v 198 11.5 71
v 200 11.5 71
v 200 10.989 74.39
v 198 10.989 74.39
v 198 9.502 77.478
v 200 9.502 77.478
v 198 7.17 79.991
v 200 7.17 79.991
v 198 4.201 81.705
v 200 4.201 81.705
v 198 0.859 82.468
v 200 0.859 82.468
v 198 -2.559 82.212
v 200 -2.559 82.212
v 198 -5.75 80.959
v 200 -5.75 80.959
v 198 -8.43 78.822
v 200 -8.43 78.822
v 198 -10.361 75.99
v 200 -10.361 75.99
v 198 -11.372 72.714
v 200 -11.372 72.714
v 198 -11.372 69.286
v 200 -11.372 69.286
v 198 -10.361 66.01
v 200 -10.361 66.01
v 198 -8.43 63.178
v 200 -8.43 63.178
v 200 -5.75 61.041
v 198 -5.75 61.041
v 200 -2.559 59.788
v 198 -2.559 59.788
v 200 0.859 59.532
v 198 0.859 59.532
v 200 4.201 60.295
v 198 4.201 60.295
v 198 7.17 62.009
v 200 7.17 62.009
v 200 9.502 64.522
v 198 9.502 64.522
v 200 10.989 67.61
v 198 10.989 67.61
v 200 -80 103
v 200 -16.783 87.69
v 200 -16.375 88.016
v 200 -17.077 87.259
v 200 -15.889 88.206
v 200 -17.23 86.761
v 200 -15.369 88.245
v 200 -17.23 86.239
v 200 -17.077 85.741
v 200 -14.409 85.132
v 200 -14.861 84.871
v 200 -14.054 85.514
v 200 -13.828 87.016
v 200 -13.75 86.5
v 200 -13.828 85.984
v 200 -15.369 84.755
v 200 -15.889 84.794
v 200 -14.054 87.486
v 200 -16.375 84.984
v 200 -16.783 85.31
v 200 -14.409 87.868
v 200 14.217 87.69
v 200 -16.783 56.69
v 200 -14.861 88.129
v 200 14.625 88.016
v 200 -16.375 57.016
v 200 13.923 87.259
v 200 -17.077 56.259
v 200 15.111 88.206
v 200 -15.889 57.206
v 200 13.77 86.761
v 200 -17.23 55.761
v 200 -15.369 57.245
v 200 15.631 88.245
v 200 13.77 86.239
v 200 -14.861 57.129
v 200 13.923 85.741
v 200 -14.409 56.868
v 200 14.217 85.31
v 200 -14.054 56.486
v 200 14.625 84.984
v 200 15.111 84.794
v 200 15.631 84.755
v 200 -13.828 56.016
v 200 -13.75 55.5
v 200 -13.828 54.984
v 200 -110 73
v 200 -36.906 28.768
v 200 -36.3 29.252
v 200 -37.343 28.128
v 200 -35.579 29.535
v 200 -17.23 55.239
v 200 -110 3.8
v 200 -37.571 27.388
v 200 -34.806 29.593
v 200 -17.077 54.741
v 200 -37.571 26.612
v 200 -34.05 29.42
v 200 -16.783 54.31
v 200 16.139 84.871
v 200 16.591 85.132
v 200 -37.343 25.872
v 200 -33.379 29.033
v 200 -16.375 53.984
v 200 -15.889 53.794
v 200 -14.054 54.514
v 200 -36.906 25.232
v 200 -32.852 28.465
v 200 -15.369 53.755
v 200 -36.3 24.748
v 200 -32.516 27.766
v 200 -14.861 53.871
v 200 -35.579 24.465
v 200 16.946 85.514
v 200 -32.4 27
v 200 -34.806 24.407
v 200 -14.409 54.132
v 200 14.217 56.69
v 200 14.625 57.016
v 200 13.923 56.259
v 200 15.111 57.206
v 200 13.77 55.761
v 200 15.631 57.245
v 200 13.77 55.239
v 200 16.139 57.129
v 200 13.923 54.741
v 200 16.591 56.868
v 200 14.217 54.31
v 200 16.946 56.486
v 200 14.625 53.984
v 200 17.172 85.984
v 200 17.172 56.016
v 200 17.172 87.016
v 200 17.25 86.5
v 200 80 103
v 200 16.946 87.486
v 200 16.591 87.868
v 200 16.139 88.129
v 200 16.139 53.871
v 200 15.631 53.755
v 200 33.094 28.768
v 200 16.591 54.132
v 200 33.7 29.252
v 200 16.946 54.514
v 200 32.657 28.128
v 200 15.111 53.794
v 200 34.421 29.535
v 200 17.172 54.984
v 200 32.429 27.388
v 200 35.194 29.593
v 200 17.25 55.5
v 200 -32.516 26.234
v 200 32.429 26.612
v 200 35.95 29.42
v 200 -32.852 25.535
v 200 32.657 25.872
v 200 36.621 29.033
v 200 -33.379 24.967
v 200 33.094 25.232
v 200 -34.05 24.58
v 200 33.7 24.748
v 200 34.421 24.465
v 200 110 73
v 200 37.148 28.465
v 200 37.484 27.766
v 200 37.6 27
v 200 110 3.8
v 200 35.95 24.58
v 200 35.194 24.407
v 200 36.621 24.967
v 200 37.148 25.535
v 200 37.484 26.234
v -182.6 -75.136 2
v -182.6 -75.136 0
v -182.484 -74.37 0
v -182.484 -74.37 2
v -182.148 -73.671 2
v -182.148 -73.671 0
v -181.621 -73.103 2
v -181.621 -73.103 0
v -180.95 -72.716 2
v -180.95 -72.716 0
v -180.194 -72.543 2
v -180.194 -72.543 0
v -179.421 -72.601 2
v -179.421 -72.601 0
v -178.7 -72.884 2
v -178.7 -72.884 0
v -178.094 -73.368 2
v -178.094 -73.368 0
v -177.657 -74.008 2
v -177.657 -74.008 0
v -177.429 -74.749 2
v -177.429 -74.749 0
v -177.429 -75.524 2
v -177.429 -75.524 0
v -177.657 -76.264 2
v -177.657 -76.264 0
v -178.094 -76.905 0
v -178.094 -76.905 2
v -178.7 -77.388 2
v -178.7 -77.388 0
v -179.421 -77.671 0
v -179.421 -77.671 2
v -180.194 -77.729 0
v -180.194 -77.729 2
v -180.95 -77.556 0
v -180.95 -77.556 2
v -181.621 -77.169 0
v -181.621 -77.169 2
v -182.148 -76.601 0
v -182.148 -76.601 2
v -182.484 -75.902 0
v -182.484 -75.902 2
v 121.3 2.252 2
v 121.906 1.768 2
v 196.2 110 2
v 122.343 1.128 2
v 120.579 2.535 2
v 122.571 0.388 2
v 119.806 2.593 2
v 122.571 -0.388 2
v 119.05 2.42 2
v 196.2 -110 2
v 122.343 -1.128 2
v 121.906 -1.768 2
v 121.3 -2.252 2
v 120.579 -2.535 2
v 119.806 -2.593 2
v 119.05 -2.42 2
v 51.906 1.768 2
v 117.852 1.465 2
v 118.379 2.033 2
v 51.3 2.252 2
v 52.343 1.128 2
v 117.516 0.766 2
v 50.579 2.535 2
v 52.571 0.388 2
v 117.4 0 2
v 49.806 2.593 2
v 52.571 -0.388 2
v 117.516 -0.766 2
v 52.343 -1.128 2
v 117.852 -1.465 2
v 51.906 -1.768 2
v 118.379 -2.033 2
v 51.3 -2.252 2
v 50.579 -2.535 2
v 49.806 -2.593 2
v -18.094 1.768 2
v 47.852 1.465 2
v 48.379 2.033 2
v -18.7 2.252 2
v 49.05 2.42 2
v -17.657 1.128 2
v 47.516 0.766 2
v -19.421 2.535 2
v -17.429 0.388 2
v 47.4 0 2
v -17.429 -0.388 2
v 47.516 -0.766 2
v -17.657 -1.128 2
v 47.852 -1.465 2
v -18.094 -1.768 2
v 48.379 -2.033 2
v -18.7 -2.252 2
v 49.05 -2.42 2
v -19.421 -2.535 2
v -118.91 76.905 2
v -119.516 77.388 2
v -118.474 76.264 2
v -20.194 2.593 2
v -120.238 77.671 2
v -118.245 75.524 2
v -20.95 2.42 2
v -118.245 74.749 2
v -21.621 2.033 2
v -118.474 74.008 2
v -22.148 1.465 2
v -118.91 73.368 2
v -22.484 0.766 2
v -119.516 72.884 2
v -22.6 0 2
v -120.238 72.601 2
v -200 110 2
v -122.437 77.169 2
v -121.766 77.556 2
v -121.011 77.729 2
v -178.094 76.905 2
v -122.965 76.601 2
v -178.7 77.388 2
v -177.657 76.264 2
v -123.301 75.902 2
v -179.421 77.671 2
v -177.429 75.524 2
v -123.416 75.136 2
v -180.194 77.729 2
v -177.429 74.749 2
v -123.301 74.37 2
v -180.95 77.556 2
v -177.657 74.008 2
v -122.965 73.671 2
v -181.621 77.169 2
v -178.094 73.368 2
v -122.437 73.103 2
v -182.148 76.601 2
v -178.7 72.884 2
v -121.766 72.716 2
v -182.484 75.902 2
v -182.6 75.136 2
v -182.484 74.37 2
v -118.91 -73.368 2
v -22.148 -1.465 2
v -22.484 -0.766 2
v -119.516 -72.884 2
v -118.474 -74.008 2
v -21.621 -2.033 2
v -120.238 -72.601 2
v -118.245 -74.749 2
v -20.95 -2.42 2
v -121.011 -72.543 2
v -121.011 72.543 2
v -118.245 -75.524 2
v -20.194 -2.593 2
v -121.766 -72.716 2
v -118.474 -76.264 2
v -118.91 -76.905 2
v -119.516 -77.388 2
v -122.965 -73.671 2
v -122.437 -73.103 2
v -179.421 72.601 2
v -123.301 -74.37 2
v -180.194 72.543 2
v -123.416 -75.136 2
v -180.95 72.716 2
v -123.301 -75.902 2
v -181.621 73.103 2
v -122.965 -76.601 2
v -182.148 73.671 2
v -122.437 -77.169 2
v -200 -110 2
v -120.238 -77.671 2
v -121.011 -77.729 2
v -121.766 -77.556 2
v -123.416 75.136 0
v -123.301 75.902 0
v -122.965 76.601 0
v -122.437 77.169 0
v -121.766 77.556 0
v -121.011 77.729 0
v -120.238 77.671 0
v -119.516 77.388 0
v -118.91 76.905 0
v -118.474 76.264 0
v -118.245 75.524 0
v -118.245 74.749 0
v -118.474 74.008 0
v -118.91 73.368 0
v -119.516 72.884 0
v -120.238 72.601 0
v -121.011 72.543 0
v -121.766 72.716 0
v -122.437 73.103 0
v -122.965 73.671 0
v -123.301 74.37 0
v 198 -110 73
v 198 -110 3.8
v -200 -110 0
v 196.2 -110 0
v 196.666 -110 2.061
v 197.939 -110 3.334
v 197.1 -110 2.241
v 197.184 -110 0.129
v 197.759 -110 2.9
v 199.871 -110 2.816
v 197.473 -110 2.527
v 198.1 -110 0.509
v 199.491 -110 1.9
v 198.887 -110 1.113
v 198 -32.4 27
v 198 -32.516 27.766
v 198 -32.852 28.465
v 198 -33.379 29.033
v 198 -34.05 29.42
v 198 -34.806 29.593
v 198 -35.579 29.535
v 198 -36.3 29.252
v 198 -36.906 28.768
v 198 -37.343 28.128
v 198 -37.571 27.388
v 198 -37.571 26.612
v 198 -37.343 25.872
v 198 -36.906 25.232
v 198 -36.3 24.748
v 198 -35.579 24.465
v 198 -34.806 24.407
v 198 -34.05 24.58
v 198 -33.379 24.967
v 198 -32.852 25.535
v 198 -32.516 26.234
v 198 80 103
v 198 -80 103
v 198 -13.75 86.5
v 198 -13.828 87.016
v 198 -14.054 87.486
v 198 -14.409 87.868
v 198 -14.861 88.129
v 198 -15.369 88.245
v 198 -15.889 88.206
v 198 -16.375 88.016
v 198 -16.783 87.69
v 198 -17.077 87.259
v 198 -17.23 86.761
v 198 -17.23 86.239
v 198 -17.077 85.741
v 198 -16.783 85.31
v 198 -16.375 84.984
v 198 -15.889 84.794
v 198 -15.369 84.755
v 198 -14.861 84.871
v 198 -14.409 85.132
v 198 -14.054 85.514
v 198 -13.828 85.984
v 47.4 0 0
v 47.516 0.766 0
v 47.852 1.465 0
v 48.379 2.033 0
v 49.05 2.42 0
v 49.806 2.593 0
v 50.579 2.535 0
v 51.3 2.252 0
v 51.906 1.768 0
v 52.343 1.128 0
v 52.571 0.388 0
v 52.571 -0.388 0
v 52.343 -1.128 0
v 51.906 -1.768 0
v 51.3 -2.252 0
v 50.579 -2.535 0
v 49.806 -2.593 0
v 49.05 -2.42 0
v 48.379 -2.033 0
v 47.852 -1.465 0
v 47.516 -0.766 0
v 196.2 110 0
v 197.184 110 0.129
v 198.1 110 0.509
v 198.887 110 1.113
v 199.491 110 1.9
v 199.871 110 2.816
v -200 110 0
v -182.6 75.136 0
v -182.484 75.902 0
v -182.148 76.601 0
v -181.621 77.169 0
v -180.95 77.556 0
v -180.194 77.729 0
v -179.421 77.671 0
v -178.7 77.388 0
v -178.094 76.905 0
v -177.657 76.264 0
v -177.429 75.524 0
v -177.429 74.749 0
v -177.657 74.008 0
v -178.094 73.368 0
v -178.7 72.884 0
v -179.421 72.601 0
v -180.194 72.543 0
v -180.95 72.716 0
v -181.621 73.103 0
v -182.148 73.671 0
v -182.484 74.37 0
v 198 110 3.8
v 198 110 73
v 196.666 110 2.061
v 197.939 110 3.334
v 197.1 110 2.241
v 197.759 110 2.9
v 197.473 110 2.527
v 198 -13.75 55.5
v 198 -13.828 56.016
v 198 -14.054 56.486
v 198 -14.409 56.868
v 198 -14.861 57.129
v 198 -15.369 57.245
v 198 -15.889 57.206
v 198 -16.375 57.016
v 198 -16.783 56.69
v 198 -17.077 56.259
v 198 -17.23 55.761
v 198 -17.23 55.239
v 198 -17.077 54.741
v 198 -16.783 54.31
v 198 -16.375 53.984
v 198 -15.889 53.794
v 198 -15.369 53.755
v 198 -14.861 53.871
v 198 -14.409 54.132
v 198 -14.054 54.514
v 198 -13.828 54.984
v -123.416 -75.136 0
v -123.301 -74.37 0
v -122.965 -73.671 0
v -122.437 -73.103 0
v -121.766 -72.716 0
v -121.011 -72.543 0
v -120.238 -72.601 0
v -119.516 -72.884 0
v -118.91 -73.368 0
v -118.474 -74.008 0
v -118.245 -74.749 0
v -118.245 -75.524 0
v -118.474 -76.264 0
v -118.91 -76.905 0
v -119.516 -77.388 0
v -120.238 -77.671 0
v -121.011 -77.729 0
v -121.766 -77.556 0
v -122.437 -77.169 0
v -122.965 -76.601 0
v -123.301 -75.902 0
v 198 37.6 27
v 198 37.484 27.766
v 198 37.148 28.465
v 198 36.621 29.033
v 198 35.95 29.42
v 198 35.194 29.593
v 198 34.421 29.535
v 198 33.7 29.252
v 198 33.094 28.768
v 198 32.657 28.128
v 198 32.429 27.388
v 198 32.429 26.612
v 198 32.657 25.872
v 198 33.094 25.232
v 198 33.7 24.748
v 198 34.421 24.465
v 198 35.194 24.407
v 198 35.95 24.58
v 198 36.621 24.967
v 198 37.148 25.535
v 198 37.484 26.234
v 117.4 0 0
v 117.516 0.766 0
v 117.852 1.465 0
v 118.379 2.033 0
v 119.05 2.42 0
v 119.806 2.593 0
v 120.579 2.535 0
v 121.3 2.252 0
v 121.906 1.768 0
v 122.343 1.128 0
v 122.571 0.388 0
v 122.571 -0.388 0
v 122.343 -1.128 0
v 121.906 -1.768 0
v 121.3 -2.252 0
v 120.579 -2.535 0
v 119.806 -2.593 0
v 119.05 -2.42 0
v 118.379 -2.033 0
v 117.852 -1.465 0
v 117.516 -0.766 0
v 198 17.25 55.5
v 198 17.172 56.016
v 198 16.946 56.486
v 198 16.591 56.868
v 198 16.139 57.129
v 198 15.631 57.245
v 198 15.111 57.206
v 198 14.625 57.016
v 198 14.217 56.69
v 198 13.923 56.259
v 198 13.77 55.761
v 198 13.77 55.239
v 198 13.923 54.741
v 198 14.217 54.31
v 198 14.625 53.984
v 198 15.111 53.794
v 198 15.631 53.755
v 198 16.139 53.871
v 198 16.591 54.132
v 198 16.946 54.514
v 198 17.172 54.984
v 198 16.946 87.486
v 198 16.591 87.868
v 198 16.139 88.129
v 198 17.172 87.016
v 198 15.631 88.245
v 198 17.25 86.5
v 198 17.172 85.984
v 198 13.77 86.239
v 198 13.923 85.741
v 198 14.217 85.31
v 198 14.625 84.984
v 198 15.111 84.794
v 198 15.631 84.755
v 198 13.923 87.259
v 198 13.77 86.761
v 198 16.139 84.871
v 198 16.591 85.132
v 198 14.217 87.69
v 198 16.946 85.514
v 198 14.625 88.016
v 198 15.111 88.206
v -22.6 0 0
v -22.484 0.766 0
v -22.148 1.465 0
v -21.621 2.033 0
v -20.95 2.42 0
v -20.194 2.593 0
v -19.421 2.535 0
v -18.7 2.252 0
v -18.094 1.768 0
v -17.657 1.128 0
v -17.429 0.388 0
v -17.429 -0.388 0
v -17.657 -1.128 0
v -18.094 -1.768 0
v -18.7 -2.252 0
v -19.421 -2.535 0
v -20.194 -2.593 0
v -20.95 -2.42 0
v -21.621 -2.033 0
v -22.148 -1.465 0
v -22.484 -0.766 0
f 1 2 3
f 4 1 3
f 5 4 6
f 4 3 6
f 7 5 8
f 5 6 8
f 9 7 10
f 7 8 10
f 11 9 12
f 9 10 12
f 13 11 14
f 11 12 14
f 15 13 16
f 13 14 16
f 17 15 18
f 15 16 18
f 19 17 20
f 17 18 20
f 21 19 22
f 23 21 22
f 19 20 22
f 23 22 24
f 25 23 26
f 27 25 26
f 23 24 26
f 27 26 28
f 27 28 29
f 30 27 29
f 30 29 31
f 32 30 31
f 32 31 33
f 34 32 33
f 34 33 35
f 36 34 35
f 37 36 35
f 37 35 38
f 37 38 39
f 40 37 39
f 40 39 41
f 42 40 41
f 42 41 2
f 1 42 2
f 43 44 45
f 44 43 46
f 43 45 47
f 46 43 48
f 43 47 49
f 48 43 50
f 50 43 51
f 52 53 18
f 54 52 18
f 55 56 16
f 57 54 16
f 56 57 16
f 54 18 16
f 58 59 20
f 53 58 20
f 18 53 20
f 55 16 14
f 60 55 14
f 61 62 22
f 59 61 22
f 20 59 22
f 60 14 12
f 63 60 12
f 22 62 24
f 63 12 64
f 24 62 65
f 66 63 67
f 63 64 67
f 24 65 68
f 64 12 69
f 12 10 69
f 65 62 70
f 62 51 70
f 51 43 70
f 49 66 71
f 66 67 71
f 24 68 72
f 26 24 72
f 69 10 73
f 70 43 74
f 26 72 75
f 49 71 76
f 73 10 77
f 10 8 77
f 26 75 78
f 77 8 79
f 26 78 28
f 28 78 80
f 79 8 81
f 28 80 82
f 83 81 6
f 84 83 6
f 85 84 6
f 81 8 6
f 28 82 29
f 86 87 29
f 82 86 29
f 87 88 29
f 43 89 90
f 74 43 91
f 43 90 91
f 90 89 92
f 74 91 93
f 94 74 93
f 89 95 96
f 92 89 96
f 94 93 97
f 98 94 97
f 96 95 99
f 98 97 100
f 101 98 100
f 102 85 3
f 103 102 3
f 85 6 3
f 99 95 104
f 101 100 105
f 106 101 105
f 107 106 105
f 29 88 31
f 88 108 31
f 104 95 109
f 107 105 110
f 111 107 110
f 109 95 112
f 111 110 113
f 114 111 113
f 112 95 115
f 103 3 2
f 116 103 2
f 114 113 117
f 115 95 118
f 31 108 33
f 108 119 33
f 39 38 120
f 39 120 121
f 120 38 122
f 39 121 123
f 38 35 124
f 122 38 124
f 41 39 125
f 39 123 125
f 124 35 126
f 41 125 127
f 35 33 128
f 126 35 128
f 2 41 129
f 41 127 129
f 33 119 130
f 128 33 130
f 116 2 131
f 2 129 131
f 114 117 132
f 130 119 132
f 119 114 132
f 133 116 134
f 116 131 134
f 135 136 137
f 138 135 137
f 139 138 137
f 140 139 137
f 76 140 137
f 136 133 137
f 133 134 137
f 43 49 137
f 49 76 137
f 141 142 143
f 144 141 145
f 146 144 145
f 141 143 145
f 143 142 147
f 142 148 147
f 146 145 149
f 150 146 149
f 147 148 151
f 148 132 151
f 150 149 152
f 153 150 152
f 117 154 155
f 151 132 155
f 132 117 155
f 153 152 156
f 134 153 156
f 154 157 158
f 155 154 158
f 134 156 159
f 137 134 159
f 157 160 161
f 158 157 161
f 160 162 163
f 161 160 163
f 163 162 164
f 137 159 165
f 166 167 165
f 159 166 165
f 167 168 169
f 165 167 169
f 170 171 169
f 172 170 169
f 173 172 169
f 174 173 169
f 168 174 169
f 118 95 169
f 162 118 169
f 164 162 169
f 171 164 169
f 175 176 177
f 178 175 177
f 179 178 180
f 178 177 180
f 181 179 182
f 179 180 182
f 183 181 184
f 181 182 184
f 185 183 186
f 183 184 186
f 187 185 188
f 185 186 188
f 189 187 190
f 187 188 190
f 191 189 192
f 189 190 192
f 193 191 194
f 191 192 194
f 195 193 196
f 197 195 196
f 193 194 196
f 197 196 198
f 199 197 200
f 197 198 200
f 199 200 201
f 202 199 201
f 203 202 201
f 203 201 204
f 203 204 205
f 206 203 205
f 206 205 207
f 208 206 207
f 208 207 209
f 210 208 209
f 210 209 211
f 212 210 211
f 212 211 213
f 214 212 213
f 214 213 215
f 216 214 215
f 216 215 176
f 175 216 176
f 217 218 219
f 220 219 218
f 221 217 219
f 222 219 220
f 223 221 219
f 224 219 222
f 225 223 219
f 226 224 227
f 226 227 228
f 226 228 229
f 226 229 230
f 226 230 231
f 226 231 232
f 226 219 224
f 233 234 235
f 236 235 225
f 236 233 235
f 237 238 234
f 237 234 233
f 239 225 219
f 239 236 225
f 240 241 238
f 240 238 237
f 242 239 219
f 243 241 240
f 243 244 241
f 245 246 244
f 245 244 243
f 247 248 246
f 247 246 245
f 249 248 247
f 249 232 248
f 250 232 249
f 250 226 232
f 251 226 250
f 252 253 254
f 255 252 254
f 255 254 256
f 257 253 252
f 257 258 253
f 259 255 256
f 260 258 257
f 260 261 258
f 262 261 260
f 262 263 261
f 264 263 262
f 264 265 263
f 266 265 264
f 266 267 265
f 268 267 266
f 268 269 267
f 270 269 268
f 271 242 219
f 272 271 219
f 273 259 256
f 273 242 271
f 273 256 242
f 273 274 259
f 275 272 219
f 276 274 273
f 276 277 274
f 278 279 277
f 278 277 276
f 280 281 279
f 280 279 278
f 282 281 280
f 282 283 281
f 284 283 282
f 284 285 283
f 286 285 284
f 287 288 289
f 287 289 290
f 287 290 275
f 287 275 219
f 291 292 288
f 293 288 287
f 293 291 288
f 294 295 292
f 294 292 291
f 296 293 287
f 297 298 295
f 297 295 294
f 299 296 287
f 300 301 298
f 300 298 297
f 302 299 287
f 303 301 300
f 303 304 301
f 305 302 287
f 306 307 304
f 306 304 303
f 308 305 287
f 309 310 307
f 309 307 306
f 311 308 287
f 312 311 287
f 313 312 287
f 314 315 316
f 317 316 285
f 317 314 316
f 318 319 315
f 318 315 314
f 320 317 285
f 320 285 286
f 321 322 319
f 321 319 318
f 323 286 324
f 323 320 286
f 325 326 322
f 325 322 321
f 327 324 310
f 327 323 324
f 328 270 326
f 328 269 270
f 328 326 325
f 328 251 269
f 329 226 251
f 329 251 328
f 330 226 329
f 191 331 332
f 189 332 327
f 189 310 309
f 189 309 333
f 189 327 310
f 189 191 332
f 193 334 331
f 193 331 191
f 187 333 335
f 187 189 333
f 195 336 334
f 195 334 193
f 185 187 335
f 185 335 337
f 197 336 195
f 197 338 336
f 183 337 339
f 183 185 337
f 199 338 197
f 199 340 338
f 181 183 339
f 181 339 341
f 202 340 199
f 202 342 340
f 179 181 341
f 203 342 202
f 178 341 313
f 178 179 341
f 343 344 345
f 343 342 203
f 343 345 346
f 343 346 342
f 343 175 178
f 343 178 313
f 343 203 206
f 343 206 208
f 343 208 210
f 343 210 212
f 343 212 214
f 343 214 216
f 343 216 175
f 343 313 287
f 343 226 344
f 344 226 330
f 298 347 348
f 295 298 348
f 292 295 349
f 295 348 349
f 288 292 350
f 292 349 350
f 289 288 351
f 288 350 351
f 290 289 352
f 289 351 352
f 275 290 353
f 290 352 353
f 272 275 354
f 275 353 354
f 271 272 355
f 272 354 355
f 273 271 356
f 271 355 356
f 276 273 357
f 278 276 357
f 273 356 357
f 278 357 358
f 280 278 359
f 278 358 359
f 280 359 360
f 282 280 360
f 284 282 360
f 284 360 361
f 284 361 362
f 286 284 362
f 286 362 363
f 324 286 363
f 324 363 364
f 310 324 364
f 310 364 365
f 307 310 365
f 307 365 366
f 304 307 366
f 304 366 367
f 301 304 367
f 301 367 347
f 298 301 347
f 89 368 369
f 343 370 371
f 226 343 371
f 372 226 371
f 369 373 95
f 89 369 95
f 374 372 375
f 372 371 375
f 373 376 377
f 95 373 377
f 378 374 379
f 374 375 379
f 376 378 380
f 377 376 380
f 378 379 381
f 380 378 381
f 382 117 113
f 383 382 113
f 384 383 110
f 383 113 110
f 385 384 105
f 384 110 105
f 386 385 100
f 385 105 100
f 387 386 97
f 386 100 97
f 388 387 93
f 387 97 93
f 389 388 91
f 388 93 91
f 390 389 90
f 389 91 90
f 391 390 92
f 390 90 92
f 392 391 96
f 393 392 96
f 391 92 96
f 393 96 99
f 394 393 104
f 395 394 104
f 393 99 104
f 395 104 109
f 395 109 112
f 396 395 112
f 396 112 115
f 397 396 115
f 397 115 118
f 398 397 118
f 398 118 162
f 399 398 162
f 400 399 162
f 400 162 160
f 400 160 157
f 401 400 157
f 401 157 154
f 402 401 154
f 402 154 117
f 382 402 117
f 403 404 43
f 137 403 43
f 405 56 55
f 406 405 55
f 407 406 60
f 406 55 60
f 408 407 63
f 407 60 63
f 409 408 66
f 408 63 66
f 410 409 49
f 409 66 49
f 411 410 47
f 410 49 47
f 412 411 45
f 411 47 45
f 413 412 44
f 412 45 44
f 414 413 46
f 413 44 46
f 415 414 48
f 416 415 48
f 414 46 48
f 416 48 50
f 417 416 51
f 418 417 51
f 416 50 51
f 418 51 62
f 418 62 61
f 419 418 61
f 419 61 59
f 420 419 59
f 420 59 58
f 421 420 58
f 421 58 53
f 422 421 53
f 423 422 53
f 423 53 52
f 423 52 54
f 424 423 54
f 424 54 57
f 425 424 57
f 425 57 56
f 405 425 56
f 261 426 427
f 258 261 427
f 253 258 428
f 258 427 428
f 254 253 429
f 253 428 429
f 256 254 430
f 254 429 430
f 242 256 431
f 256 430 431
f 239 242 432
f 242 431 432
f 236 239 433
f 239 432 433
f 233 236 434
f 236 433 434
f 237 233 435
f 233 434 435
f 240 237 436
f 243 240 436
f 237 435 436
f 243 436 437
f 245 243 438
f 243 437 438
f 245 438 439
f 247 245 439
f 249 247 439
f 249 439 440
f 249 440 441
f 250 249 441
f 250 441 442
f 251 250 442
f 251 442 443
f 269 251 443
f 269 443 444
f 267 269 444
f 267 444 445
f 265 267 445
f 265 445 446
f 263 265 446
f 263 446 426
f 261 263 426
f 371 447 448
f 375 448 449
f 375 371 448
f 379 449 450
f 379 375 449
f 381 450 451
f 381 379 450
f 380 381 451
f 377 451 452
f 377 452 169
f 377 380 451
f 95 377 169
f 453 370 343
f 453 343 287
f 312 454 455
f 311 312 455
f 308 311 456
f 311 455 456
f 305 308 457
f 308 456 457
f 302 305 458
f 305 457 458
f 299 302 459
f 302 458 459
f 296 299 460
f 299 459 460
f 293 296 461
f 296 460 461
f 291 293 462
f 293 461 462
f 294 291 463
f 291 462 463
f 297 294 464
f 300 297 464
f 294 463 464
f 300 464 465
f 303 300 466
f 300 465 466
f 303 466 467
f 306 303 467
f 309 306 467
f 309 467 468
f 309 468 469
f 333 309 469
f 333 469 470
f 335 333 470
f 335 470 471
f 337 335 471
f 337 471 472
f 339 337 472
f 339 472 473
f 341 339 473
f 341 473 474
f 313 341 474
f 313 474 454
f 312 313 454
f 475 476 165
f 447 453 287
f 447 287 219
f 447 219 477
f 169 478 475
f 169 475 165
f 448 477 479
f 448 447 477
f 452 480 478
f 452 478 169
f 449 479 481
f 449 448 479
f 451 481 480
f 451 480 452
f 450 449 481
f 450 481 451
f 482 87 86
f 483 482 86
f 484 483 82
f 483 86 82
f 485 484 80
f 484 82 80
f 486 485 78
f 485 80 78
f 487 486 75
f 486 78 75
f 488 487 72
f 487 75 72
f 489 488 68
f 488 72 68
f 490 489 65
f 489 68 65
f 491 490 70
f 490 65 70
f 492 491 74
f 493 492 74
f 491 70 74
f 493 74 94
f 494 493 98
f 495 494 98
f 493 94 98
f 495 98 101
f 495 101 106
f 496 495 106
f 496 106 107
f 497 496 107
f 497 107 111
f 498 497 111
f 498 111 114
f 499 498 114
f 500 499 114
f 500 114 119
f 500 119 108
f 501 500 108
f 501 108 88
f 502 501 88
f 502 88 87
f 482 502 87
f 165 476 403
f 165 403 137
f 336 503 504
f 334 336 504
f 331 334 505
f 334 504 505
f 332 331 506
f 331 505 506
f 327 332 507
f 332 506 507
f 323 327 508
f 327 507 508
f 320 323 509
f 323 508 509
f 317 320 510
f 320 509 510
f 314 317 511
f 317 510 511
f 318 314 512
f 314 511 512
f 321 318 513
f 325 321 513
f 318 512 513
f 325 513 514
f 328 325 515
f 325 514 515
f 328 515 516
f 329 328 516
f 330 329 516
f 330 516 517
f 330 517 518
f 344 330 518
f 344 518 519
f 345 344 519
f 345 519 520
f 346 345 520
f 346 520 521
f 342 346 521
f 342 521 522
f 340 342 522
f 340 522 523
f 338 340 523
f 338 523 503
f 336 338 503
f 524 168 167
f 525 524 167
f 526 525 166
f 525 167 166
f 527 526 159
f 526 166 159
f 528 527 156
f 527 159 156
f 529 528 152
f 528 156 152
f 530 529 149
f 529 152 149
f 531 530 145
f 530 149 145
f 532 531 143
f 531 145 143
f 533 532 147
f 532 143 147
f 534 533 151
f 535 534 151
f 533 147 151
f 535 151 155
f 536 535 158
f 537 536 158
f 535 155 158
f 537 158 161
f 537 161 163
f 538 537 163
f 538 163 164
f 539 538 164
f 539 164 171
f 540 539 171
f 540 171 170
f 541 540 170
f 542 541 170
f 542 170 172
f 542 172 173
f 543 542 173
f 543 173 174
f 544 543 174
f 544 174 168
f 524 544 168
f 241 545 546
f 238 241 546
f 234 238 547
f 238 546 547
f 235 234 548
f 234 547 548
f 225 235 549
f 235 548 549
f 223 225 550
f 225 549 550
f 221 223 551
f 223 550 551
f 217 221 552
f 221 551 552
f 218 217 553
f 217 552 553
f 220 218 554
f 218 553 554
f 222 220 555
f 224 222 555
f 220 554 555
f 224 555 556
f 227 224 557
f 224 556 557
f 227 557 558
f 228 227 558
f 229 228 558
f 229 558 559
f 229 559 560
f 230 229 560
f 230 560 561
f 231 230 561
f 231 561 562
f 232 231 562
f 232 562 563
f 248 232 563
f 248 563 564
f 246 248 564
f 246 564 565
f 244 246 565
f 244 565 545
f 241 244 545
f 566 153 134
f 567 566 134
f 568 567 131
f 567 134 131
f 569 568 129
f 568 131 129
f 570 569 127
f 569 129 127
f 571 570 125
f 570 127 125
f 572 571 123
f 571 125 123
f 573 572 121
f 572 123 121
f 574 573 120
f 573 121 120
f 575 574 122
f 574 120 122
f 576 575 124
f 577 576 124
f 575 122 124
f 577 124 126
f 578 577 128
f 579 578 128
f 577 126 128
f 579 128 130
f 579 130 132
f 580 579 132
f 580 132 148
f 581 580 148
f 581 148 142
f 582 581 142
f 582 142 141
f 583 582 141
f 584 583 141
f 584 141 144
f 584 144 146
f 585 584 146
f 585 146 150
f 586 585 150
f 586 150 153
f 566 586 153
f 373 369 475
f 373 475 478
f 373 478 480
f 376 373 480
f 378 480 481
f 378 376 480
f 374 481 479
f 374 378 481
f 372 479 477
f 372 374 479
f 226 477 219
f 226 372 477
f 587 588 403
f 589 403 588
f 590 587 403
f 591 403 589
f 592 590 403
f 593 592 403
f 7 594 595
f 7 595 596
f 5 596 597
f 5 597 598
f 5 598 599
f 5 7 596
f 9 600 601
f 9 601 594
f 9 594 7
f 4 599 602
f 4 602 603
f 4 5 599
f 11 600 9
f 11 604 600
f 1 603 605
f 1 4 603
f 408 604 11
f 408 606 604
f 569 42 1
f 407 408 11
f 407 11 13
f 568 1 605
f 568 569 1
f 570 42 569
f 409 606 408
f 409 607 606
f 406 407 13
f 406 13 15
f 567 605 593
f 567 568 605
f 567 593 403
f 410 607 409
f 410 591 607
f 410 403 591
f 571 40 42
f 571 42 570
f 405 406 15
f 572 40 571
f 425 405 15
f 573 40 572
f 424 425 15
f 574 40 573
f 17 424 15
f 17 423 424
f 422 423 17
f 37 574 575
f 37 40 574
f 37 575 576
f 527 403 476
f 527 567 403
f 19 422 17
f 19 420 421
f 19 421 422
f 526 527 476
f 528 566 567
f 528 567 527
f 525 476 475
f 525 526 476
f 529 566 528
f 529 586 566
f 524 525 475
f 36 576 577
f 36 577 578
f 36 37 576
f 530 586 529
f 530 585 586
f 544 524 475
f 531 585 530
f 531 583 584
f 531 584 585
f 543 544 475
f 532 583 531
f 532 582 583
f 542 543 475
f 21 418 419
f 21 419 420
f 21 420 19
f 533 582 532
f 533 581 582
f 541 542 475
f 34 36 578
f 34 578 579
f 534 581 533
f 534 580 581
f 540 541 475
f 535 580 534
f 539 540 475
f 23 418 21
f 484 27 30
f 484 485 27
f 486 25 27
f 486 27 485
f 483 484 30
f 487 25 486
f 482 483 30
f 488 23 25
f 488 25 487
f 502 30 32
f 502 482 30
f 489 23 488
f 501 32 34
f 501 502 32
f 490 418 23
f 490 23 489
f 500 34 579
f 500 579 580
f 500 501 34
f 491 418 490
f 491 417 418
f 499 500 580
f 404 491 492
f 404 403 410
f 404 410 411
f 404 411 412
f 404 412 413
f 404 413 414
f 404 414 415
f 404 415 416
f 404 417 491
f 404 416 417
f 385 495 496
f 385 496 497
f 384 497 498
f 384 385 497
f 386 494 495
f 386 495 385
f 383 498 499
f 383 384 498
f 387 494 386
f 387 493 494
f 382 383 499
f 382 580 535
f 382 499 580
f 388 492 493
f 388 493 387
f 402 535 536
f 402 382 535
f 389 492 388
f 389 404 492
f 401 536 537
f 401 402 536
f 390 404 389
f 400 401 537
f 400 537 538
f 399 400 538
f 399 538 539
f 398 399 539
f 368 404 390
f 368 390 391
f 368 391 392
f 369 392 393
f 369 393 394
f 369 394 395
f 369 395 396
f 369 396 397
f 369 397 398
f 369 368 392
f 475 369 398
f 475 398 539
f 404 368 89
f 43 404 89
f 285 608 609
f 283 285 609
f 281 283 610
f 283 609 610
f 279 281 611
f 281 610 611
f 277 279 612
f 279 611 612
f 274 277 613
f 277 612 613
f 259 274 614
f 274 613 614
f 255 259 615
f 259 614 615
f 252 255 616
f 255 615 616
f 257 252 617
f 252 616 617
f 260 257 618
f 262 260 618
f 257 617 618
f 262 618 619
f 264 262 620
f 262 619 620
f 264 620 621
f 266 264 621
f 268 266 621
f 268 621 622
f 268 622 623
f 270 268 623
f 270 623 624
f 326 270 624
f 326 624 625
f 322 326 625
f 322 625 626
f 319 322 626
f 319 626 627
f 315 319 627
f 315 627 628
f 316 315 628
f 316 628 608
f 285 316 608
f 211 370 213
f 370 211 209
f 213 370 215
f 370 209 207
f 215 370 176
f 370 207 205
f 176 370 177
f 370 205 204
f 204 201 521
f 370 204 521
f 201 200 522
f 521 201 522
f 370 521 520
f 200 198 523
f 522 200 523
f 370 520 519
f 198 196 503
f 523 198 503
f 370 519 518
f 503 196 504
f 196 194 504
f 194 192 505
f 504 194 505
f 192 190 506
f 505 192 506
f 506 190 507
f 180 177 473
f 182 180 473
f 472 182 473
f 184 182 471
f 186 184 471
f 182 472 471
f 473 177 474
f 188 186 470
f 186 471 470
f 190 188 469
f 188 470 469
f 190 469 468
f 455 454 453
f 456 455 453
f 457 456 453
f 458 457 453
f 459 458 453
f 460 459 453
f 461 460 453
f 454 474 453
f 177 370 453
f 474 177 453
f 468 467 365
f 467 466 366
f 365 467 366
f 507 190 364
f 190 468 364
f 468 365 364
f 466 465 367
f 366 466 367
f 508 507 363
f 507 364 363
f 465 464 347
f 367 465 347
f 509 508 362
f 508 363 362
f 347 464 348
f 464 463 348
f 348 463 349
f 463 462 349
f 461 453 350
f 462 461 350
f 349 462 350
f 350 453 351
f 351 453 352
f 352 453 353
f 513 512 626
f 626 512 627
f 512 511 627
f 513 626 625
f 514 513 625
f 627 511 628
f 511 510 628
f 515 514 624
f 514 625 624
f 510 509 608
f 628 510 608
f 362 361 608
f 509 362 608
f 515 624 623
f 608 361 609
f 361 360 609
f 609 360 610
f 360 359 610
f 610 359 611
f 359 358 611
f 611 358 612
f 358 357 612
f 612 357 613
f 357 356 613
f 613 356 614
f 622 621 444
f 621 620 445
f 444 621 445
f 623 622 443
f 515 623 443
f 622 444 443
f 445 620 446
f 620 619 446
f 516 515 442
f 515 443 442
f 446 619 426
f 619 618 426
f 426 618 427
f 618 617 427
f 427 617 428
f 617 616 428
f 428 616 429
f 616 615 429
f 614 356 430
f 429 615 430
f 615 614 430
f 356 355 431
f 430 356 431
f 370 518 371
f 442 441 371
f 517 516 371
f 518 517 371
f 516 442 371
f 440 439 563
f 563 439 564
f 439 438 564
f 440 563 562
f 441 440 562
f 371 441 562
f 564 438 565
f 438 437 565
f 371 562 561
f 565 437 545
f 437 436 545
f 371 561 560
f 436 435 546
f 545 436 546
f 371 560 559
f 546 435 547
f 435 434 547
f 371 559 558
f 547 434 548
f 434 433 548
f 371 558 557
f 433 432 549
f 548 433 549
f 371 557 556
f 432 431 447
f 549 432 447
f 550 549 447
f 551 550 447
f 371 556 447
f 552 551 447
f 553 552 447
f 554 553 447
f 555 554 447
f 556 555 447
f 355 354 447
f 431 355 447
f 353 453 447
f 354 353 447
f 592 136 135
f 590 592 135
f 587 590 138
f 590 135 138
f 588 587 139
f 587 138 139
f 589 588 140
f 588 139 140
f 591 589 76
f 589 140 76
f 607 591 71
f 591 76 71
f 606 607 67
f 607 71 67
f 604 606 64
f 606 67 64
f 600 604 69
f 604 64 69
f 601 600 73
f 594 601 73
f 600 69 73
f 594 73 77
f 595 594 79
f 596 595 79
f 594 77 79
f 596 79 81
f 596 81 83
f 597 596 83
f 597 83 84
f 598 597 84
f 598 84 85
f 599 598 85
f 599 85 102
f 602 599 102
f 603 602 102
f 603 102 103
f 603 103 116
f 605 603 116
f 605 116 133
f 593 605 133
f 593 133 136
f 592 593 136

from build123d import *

# Parameters (mm, degrees)
SKETCH1_W            = 400
SKETCH1_H            = 220
BOSS_EXTRUDE1_DEPTH  = 3
SKETCH2_R            = 2.6
CUT_EXTRUDE1_DEPTH   = 90
SKETCH3_W            = 4
SKETCH3_H            = 220
BOSS_EXTRUDE2_DEPTH  = 90
SKETCH4_R            = 11.5
CUT_EXTRUDE2_DEPTH   = 90
SKETCH5_R            = 1.75
CUT_EXTRUDE3_DEPTH   = 90
SKETCH7_W            = 4
SKETCH7_H            = 220
BOSS_EXTRUDE3_DEPTH  = 10
CONVERT_SOLID2_START = -110
CONVERT_SOLID2_DEPTH = 220
CHAMFER1_SIZE        = 30
SKETCH6_R            = 2.6
CUT_EXTRUDE4_DEPTH   = 90


# Read off the part's stored shape, not the designer's step: Convert-Solid2
with BuildPart() as part:
    # Sketch1 → Boss-Extrude1 (new body)
    with BuildSketch(Plane.XY):
        Rectangle(SKETCH1_W, SKETCH1_H)
    extrude(amount=BOSS_EXTRUDE1_DEPTH)

    # Sketch2 → Cut-Extrude1 (cut)
    with BuildSketch(Plane(origin=(0, 0, 0), x_dir=(-1, 0, 0), z_dir=(0, 0, -1))):
        with Locations((-120, 0)):
            Circle(SKETCH2_R)
        with Locations((-50, 0)):
            Circle(SKETCH2_R)
        with Locations((20, 0)):
            Circle(SKETCH2_R)
        with Locations((120.81636457, -75.136060762)):
            Circle(SKETCH2_R)
        with Locations((120.81636457, 75.136060762)):
            Circle(SKETCH2_R)
        with Locations((180, 75.136060762)):
            Circle(SKETCH2_R)
        with Locations((180, -75.136060762)):
            Circle(SKETCH2_R)
    extrude(amount=-CUT_EXTRUDE1_DEPTH, mode=Mode.SUBTRACT)

    # Sketch3 → Boss-Extrude2 (add)
    with BuildSketch(Plane.XY.offset(3)):
        with Locations((198, 0)):
            Rectangle(SKETCH3_W, SKETCH3_H)
    extrude(amount=BOSS_EXTRUDE2_DEPTH)

    # Sketch4 → Cut-Extrude2 (cut)
    with BuildSketch(Plane(origin=(200, 0, 0), x_dir=(0, 0, -1), z_dir=(1, 0, 0))):
        with Locations(Location((-71, 0, 0), (0, 0, 90))):
            Circle(SKETCH4_R)
    extrude(amount=-CUT_EXTRUDE2_DEPTH, mode=Mode.SUBTRACT)

    # Sketch5 → Cut-Extrude3 (cut)
    with BuildSketch(Plane(origin=(200, 0, 0), x_dir=(0, 0, -1), z_dir=(1, 0, 0))):
        with Locations(Location((-55.5, 15.5, 0), (0, 0, 90))):
            Circle(SKETCH5_R)
        with Locations(Location((-55.5, -15.5, 0), (0, 0, 90))):
            Circle(SKETCH5_R)
        with Locations(Location((-86.5, -15.5, 0), (0, 0, 90))):
            Circle(SKETCH5_R)
        with Locations(Location((-86.5, 15.5, 0), (0, 0, 90))):
            Circle(SKETCH5_R)
    extrude(amount=-CUT_EXTRUDE3_DEPTH, mode=Mode.SUBTRACT)

    # Sketch7 → Boss-Extrude3 (add)
    with BuildSketch(Plane.XY.offset(93)):
        with Locations((198, 0)):
            Rectangle(SKETCH7_W, SKETCH7_H)
    extrude(amount=BOSS_EXTRUDE3_DEPTH)

    # Convert-Solid2 outline → Convert-Solid2 (cut)
    with BuildSketch(Plane(origin=(0, 0, 0), x_dir=(1, 0, 0), z_dir=(0, 1, 0)).offset(CONVERT_SOLID2_START)):
        with BuildLine():
            ThreePointArc((196.2, 0), (198.887005769, -1.112994231), (200, -3.8))
            Line((200, -3.8), (200, 0))
            Line((200, 0), (196.2, 0))
        make_face()
        with BuildLine():
            Line((196, -103), (198, -103))
            Line((198, -103), (198, -3.8))
            ThreePointArc((198, -3.8), (197.472792206, -2.527207794), (196.2, -2))
            Line((196.2, -2), (-200, -2))
            Line((-200, -2), (-200, -3))
            Line((-200, -3), (196, -3))
            Line((196, -3), (196, -103))
        make_face()
    extrude(amount=CONVERT_SOLID2_DEPTH, mode=Mode.SUBTRACT)

    # Chamfer1
    chamfer1_edges = [part.edges().sort_by_distance(p)[0] for p in [
        (199, -110, 103),
        (199, 110, 103),
    ]]
    chamfer(chamfer1_edges, length=CHAMFER1_SIZE)

    # Sketch6 → Cut-Extrude4 (cut)
    with BuildSketch(Plane(origin=(200, 0, 0), x_dir=(0, 0, -1), z_dir=(1, 0, 0))):
        with Locations(Location((-27, -35, 0), (0, 0, 90))):
            Circle(SKETCH6_R)
        with Locations(Location((-27, 35, 0), (0, 0, 90))):
            Circle(SKETCH6_R)
    extrude(amount=-CUT_EXTRUDE4_DEPTH, mode=Mode.SUBTRACT)


solid = part.part
